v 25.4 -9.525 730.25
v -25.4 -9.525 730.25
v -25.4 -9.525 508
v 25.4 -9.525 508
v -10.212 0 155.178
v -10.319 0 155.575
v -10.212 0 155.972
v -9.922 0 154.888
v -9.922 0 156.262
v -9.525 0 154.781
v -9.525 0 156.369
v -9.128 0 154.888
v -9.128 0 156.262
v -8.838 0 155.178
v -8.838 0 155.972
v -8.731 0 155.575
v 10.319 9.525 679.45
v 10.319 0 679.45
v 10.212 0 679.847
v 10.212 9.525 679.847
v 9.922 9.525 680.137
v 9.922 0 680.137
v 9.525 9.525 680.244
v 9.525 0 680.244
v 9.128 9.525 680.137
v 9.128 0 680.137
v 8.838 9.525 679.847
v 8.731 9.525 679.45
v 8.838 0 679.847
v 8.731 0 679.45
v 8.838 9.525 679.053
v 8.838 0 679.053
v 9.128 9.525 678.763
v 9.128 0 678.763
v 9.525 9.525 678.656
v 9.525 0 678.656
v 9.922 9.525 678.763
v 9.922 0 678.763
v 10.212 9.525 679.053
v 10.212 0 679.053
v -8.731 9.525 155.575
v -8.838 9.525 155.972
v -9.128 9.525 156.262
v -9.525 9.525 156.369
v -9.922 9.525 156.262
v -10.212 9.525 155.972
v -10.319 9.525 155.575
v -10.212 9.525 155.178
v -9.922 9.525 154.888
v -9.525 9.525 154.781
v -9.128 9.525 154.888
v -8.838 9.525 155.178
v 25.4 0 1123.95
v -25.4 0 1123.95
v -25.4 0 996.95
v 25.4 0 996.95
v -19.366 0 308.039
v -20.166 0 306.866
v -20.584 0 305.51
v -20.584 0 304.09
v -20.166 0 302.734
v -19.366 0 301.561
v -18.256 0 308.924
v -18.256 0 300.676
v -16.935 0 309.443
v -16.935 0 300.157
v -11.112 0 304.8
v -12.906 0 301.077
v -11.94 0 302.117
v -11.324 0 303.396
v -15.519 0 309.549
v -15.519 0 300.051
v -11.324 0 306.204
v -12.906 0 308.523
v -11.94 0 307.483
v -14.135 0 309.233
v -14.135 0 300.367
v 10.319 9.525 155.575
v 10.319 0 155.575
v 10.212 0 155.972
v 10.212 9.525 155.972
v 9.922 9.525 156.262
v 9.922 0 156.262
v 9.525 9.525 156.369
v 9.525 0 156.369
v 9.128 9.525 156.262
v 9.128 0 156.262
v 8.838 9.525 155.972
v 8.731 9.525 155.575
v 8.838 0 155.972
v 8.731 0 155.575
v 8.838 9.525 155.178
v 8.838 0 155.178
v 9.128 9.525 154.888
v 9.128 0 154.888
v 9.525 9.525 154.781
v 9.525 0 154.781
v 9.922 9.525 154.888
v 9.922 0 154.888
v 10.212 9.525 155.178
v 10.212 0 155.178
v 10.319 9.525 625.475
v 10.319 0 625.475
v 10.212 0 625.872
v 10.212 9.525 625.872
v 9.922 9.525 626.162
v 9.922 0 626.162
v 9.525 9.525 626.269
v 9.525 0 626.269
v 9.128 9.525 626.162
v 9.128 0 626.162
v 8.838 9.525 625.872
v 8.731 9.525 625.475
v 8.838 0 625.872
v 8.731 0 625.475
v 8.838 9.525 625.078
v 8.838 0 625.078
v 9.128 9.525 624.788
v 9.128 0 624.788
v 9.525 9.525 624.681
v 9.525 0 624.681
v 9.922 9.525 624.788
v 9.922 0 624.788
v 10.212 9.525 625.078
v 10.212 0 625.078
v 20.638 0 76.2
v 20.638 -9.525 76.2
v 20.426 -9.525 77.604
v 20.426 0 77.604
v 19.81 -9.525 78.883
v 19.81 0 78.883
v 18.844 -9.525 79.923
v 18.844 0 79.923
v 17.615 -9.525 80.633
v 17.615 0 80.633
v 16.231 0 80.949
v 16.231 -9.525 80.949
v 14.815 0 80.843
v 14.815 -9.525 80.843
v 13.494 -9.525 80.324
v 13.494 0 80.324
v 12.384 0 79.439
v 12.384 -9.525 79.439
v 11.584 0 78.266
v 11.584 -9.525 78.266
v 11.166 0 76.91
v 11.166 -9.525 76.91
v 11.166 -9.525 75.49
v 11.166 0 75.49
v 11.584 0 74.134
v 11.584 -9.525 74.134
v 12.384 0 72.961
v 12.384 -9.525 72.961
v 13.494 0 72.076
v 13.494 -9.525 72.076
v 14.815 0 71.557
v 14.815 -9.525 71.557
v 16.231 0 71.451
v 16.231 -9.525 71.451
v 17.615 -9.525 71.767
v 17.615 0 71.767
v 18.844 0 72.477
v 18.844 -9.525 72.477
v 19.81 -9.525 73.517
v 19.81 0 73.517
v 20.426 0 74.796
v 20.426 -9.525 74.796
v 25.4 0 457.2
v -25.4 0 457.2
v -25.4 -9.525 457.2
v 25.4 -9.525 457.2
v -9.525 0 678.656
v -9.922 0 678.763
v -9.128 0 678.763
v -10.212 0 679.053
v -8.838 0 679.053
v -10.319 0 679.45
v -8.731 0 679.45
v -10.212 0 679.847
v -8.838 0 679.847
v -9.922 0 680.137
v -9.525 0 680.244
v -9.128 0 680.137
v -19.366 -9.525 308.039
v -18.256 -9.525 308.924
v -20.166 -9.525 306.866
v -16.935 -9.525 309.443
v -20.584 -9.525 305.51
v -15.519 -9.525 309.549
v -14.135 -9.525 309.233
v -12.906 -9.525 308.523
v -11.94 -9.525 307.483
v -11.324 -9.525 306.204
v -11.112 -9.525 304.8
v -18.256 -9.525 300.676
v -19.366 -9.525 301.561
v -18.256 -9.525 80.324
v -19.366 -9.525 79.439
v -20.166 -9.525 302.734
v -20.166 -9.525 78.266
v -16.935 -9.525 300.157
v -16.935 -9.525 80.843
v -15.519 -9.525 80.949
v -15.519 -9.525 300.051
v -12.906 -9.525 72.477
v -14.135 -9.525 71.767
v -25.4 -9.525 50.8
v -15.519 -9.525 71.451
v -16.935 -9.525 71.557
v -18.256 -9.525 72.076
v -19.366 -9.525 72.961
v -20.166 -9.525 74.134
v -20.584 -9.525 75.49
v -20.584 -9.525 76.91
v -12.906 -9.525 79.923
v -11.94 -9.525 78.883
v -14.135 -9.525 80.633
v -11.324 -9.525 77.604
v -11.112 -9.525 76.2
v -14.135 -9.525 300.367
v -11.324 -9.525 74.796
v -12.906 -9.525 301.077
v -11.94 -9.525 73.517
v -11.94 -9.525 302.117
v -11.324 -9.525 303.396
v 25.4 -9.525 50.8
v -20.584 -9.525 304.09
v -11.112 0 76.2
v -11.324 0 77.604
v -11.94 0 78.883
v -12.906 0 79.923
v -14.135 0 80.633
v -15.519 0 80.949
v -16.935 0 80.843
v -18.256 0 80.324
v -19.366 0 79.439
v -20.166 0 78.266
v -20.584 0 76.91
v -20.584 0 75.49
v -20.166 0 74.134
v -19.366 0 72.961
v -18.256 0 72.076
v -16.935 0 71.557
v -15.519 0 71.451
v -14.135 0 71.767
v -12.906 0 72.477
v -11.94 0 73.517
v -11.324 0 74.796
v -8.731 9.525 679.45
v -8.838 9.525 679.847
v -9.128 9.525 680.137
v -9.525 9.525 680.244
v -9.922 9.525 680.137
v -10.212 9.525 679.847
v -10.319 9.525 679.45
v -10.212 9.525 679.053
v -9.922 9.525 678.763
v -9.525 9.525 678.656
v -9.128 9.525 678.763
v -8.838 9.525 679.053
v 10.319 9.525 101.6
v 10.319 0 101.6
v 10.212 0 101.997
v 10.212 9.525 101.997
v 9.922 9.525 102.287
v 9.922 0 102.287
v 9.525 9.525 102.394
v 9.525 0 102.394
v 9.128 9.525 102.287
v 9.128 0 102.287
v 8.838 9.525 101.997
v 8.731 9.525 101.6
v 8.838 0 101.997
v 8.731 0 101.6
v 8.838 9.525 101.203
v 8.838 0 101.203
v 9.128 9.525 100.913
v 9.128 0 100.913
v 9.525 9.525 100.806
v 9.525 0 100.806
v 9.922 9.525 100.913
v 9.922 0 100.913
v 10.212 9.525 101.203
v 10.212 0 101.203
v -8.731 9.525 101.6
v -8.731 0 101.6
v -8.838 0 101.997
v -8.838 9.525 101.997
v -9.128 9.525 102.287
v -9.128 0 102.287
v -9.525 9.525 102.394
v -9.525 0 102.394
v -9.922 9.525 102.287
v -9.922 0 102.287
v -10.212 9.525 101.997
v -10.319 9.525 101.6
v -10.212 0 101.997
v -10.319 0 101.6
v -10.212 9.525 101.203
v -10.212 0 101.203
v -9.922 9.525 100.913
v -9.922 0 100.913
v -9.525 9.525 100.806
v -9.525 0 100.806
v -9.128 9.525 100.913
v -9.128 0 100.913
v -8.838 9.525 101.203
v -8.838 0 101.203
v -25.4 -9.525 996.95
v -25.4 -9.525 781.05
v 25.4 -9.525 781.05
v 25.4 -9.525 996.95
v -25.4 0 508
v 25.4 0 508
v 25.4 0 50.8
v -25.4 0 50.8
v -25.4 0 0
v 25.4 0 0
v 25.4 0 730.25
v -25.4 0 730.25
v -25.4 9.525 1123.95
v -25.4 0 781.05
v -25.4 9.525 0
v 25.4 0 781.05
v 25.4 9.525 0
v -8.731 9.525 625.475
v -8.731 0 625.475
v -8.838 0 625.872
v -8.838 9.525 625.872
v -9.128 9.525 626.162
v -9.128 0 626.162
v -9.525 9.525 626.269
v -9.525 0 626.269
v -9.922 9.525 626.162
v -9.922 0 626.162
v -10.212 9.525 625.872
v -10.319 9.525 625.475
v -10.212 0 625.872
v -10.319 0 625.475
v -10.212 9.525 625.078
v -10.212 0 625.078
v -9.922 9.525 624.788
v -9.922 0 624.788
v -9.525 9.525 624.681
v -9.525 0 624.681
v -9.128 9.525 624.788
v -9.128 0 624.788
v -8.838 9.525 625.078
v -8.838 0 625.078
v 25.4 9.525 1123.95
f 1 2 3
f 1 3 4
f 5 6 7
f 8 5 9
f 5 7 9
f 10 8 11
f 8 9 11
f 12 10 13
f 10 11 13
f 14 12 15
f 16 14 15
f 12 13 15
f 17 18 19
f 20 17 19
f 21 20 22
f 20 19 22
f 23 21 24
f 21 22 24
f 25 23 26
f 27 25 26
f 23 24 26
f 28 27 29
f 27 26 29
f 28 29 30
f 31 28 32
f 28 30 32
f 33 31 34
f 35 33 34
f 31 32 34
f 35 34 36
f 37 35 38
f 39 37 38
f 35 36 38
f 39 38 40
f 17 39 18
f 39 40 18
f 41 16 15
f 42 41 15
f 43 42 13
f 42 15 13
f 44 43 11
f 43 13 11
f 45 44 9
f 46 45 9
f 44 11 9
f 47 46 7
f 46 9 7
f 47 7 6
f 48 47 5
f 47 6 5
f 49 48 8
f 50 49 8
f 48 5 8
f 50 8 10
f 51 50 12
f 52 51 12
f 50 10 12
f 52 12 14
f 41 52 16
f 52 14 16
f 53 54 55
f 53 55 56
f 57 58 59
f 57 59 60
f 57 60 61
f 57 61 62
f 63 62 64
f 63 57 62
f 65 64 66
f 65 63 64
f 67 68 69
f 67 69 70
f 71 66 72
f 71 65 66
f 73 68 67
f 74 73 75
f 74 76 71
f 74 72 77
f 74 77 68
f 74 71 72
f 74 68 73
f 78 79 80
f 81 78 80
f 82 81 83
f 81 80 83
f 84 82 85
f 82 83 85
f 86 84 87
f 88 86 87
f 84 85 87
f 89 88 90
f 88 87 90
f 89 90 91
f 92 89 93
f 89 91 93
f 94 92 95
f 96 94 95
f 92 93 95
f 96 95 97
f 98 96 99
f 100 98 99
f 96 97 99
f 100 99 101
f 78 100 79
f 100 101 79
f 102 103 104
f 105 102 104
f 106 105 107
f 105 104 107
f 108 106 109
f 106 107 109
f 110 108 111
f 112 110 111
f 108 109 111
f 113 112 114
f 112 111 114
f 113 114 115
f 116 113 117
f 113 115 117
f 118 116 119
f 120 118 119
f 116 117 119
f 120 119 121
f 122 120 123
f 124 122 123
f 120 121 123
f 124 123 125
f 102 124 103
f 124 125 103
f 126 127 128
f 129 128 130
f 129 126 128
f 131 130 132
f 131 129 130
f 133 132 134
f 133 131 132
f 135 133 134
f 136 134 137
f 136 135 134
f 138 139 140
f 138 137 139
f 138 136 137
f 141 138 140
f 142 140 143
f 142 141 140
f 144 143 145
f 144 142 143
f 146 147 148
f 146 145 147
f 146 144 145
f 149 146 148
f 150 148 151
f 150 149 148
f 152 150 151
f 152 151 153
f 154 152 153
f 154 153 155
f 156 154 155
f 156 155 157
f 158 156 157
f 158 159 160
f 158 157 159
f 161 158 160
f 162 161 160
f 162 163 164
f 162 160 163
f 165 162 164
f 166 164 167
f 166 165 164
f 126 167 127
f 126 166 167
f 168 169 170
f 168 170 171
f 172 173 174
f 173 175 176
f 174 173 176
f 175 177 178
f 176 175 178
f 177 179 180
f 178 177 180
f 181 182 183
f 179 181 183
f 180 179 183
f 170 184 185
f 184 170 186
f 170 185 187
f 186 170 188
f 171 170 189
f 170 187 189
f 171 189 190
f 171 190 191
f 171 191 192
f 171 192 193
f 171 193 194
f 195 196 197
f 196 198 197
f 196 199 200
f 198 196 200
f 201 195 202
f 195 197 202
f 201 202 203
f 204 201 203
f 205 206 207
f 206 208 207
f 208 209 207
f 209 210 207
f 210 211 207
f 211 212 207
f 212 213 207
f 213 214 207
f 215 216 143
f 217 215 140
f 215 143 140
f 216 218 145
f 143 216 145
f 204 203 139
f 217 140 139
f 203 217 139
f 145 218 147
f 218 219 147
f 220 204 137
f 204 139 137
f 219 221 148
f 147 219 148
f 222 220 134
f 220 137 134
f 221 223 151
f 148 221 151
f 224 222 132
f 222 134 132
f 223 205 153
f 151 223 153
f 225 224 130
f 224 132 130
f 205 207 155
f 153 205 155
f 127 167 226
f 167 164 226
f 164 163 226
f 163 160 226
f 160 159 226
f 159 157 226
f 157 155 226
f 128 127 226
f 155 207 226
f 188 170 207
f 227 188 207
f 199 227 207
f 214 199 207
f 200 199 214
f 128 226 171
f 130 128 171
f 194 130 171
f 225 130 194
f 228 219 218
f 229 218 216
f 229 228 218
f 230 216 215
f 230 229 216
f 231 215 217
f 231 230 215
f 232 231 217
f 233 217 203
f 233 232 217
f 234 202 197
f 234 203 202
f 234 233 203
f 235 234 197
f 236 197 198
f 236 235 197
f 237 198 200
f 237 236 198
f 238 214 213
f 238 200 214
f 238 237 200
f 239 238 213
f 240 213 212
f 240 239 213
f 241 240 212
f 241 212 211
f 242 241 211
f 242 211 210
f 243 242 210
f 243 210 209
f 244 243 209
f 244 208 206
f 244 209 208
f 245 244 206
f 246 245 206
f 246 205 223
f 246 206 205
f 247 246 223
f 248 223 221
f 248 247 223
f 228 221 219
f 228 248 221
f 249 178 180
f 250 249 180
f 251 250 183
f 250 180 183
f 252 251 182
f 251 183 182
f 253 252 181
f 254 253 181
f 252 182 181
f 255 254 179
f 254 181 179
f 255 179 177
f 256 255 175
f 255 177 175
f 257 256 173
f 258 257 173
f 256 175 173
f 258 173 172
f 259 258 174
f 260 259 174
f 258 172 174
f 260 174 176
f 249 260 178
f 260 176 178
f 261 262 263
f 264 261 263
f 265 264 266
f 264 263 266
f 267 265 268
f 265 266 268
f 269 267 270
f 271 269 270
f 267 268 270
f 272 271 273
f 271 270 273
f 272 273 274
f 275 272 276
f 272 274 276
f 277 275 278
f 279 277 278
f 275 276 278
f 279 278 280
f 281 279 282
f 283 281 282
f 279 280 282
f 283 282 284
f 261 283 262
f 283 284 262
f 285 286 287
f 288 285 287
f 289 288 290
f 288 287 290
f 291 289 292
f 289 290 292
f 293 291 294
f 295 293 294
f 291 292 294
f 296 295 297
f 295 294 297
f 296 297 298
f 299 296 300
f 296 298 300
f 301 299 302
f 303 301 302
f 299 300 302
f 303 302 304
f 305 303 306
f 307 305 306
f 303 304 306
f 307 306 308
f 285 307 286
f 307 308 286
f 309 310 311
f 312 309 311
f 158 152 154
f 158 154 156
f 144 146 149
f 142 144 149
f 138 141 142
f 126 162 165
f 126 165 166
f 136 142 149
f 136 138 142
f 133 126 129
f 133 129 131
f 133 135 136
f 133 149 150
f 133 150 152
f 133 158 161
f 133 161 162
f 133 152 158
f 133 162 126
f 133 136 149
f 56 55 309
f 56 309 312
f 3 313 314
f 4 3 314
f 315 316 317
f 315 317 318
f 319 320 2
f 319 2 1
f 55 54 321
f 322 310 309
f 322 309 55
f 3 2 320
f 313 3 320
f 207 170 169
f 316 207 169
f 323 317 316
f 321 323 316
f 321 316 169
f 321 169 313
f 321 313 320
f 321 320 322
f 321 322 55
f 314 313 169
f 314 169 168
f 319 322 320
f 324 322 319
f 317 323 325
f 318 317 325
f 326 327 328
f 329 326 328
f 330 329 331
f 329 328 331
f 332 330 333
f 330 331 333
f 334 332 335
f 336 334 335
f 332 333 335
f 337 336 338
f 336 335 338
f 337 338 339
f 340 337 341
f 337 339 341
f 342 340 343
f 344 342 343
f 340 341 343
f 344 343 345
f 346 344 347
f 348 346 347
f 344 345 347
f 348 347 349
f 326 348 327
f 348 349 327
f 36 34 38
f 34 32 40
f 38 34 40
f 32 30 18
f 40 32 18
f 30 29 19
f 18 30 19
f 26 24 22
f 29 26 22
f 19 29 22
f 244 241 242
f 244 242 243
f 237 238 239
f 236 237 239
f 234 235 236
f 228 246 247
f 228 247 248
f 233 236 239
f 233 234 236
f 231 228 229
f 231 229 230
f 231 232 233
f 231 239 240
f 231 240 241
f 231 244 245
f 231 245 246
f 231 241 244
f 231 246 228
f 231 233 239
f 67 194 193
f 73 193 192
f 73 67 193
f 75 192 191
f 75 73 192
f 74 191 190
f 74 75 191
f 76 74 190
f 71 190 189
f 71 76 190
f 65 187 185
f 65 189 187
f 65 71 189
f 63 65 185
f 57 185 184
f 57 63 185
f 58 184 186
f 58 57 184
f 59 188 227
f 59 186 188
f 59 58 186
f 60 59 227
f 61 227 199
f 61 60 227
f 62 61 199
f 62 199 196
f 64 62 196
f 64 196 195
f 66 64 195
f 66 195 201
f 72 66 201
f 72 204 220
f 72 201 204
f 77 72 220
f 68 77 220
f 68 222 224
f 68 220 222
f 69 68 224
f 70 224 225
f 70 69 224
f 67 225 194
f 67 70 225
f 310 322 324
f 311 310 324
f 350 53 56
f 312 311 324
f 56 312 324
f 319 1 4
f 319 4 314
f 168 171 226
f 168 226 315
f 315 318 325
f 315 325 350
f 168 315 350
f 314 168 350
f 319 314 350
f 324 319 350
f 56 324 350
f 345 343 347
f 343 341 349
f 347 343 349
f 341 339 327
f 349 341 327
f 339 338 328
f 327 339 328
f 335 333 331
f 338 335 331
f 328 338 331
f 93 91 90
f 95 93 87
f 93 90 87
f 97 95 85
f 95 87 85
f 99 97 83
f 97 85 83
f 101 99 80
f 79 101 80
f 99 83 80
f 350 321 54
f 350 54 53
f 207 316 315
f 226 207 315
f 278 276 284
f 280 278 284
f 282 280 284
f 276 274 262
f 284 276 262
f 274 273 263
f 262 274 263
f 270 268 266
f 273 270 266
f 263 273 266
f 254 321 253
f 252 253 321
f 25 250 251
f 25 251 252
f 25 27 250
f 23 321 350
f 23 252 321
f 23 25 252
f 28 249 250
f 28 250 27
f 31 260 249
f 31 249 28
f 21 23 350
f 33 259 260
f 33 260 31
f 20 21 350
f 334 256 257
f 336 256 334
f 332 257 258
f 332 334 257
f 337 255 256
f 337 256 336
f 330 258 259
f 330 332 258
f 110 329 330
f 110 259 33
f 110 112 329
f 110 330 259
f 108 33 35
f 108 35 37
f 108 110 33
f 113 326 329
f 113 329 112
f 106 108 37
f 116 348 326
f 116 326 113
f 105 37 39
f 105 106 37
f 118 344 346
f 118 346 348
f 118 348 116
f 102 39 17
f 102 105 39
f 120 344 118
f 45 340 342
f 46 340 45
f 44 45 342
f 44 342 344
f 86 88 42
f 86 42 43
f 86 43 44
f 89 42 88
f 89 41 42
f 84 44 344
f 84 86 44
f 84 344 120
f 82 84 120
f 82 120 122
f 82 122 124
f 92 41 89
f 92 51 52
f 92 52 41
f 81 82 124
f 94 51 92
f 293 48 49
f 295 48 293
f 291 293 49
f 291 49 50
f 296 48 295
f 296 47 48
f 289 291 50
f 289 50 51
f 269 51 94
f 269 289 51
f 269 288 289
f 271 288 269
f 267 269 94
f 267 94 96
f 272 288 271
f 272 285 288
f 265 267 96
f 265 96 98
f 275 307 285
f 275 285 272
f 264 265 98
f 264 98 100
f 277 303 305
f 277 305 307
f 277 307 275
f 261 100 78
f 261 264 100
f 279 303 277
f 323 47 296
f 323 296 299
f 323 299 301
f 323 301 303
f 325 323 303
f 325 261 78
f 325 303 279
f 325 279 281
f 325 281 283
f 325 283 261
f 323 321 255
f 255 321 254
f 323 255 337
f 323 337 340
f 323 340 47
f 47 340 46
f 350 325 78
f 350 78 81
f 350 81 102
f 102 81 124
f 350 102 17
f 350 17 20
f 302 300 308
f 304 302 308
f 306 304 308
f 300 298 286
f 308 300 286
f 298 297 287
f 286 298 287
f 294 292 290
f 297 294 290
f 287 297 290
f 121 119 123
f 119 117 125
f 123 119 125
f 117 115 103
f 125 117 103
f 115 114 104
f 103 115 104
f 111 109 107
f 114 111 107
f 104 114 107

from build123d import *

# Parameters (mm, degrees)
F0_W     = 50.8
F0_H     = 19.05
F1_DEPTH = 1123.95
F2_W     = 122.435573
F2_H     = 50.8
F2_W_2   = 93.867282
F2_W_3   = 145.562325
F2_W_4   = 343.160421
F2_H_2   = 127
F3_DEPTH = 25.4
F4_R     = 0.79375
F5_DEPTH = 25.4
F6_R     = 4.7625
F7_DEPTH = 25.4


with BuildPart() as f1:
    # F0 (on Top) → F1 (new body)
    with BuildSketch(Plane.XY):
        Rectangle(F0_W, F0_H)
    extrude(amount=F1_DEPTH)

    # F2 (on Front) → F3 (cut)
    with BuildSketch(Plane.XZ):
        with Locations((22.446524, 25.4)):
            Rectangle(F2_W, F2_H)
        with Locations((2.720783, 755.65)):
            Rectangle(F2_W_2, F2_H)
        with Locations((-1.360391, 482.6)):
            Rectangle(F2_W_3, F2_H)
        with Locations((-38.781822, 1060.45)):
            Rectangle(F2_W_4, F2_H_2)
    extrude(amount=F3_DEPTH, mode=Mode.SUBTRACT)

    # F4 (on Front) → F5 (cut)
    with BuildSketch(Plane.XZ):
        with Locations((9.525, 101.6)):
            Circle(F4_R)
        with Locations((9.525, 155.575)):
            Circle(F4_R)
        with Locations((9.525, 625.475)):
            Circle(F4_R)
        with Locations((9.525, 679.45)):
            Circle(F4_R)
        with Locations((-9.525, 625.475)):
            Circle(F4_R)
        with Locations((-9.525, 679.45)):
            Circle(F4_R)
        with Locations((-9.525, 101.6)):
            Circle(F4_R)
        with Locations((-9.525, 155.575)):
            Circle(F4_R)
    extrude(amount=-F5_DEPTH, mode=Mode.SUBTRACT)

    # F6 (on Front) → F7 (cut)
    with BuildSketch(Plane.XZ):
        with Locations((15.875, 76.2)):
            Circle(F6_R)
        with Locations((-15.875, 76.2)):
            Circle(F6_R)
        with Locations((-15.875, 304.8)):
            Circle(F6_R)
    extrude(amount=F7_DEPTH, mode=Mode.SUBTRACT)


solid = f1.part
